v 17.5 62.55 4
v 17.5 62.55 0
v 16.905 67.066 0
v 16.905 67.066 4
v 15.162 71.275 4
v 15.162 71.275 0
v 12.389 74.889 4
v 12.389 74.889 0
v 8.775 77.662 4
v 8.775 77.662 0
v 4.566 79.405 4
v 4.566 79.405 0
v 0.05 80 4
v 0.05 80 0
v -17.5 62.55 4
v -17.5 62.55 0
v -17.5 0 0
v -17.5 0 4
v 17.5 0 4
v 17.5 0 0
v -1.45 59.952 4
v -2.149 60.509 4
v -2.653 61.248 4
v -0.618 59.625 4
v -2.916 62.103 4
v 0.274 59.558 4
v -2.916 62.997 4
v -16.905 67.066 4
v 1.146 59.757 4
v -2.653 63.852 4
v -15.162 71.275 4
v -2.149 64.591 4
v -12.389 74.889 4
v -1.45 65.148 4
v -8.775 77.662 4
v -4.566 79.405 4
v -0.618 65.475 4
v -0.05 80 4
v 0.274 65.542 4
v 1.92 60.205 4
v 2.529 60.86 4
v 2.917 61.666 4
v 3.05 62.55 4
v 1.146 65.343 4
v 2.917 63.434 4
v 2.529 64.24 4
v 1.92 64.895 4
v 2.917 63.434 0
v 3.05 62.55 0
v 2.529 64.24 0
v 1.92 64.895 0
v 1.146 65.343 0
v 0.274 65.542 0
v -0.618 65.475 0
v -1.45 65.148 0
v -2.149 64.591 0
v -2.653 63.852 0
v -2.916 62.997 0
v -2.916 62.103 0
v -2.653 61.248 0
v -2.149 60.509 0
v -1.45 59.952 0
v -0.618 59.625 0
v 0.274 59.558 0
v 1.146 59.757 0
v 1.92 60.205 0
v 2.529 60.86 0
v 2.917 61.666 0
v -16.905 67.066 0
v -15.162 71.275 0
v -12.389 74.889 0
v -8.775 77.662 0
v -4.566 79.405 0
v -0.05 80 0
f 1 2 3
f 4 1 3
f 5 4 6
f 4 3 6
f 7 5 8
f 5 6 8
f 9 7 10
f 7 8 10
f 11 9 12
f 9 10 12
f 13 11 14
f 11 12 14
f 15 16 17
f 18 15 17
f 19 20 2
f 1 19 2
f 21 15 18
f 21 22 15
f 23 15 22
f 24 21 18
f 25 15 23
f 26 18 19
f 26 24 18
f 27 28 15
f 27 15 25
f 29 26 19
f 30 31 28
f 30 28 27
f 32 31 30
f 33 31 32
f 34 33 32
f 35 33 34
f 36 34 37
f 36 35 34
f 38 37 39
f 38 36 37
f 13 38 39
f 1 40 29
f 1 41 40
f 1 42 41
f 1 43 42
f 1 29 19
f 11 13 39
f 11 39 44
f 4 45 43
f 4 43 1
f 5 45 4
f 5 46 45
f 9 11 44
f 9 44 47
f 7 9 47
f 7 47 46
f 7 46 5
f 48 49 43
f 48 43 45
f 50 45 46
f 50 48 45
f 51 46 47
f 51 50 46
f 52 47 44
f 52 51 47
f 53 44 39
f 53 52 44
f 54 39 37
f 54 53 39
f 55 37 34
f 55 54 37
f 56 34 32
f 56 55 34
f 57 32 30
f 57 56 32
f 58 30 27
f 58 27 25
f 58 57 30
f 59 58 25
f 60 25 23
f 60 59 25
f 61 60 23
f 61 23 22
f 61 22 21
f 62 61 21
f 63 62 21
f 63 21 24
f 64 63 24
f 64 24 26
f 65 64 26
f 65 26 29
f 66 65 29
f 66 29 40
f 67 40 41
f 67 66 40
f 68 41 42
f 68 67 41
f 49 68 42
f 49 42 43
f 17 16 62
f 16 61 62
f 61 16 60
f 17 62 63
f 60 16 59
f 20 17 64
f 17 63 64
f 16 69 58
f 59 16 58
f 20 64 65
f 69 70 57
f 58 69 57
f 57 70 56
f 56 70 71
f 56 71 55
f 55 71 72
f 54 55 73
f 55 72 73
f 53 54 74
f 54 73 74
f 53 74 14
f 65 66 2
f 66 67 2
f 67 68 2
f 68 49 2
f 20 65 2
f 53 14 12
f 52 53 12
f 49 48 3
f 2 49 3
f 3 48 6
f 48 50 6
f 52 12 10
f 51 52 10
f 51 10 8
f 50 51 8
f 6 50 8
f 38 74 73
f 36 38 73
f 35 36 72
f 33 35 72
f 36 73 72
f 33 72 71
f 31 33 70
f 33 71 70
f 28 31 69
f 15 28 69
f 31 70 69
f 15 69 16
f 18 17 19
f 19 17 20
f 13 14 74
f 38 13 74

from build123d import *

# Parameters (mm, degrees)
SKETCH_1_R      = 3
EXTRUDE_1_DEPTH = 4


with BuildPart() as part:
    # Эскиз1 → Бобышка-Вытянуть1 (new body)
    with BuildSketch(Plane.XY):
        with BuildLine():
            Line((-17.5, 0), (17.5, 0))
            Line((17.5, 0), (17.5, 62.55))
            ThreePointArc((17.5, 62.55), (12.389013332, 74.889013332), (0.05, 80))
            Line((0.05, 80), (-0.05, 80))
            ThreePointArc((-0.05, 80), (-12.389013332, 74.889013332), (-17.5, 62.55))
            Line((-17.5, 62.55), (-17.5, 0))
        make_face()
        with Locations((0.05, 62.55)):
            Circle(SKETCH_1_R, mode=Mode.SUBTRACT)
    extrude(amount=EXTRUDE_1_DEPTH)


solid = part.part
